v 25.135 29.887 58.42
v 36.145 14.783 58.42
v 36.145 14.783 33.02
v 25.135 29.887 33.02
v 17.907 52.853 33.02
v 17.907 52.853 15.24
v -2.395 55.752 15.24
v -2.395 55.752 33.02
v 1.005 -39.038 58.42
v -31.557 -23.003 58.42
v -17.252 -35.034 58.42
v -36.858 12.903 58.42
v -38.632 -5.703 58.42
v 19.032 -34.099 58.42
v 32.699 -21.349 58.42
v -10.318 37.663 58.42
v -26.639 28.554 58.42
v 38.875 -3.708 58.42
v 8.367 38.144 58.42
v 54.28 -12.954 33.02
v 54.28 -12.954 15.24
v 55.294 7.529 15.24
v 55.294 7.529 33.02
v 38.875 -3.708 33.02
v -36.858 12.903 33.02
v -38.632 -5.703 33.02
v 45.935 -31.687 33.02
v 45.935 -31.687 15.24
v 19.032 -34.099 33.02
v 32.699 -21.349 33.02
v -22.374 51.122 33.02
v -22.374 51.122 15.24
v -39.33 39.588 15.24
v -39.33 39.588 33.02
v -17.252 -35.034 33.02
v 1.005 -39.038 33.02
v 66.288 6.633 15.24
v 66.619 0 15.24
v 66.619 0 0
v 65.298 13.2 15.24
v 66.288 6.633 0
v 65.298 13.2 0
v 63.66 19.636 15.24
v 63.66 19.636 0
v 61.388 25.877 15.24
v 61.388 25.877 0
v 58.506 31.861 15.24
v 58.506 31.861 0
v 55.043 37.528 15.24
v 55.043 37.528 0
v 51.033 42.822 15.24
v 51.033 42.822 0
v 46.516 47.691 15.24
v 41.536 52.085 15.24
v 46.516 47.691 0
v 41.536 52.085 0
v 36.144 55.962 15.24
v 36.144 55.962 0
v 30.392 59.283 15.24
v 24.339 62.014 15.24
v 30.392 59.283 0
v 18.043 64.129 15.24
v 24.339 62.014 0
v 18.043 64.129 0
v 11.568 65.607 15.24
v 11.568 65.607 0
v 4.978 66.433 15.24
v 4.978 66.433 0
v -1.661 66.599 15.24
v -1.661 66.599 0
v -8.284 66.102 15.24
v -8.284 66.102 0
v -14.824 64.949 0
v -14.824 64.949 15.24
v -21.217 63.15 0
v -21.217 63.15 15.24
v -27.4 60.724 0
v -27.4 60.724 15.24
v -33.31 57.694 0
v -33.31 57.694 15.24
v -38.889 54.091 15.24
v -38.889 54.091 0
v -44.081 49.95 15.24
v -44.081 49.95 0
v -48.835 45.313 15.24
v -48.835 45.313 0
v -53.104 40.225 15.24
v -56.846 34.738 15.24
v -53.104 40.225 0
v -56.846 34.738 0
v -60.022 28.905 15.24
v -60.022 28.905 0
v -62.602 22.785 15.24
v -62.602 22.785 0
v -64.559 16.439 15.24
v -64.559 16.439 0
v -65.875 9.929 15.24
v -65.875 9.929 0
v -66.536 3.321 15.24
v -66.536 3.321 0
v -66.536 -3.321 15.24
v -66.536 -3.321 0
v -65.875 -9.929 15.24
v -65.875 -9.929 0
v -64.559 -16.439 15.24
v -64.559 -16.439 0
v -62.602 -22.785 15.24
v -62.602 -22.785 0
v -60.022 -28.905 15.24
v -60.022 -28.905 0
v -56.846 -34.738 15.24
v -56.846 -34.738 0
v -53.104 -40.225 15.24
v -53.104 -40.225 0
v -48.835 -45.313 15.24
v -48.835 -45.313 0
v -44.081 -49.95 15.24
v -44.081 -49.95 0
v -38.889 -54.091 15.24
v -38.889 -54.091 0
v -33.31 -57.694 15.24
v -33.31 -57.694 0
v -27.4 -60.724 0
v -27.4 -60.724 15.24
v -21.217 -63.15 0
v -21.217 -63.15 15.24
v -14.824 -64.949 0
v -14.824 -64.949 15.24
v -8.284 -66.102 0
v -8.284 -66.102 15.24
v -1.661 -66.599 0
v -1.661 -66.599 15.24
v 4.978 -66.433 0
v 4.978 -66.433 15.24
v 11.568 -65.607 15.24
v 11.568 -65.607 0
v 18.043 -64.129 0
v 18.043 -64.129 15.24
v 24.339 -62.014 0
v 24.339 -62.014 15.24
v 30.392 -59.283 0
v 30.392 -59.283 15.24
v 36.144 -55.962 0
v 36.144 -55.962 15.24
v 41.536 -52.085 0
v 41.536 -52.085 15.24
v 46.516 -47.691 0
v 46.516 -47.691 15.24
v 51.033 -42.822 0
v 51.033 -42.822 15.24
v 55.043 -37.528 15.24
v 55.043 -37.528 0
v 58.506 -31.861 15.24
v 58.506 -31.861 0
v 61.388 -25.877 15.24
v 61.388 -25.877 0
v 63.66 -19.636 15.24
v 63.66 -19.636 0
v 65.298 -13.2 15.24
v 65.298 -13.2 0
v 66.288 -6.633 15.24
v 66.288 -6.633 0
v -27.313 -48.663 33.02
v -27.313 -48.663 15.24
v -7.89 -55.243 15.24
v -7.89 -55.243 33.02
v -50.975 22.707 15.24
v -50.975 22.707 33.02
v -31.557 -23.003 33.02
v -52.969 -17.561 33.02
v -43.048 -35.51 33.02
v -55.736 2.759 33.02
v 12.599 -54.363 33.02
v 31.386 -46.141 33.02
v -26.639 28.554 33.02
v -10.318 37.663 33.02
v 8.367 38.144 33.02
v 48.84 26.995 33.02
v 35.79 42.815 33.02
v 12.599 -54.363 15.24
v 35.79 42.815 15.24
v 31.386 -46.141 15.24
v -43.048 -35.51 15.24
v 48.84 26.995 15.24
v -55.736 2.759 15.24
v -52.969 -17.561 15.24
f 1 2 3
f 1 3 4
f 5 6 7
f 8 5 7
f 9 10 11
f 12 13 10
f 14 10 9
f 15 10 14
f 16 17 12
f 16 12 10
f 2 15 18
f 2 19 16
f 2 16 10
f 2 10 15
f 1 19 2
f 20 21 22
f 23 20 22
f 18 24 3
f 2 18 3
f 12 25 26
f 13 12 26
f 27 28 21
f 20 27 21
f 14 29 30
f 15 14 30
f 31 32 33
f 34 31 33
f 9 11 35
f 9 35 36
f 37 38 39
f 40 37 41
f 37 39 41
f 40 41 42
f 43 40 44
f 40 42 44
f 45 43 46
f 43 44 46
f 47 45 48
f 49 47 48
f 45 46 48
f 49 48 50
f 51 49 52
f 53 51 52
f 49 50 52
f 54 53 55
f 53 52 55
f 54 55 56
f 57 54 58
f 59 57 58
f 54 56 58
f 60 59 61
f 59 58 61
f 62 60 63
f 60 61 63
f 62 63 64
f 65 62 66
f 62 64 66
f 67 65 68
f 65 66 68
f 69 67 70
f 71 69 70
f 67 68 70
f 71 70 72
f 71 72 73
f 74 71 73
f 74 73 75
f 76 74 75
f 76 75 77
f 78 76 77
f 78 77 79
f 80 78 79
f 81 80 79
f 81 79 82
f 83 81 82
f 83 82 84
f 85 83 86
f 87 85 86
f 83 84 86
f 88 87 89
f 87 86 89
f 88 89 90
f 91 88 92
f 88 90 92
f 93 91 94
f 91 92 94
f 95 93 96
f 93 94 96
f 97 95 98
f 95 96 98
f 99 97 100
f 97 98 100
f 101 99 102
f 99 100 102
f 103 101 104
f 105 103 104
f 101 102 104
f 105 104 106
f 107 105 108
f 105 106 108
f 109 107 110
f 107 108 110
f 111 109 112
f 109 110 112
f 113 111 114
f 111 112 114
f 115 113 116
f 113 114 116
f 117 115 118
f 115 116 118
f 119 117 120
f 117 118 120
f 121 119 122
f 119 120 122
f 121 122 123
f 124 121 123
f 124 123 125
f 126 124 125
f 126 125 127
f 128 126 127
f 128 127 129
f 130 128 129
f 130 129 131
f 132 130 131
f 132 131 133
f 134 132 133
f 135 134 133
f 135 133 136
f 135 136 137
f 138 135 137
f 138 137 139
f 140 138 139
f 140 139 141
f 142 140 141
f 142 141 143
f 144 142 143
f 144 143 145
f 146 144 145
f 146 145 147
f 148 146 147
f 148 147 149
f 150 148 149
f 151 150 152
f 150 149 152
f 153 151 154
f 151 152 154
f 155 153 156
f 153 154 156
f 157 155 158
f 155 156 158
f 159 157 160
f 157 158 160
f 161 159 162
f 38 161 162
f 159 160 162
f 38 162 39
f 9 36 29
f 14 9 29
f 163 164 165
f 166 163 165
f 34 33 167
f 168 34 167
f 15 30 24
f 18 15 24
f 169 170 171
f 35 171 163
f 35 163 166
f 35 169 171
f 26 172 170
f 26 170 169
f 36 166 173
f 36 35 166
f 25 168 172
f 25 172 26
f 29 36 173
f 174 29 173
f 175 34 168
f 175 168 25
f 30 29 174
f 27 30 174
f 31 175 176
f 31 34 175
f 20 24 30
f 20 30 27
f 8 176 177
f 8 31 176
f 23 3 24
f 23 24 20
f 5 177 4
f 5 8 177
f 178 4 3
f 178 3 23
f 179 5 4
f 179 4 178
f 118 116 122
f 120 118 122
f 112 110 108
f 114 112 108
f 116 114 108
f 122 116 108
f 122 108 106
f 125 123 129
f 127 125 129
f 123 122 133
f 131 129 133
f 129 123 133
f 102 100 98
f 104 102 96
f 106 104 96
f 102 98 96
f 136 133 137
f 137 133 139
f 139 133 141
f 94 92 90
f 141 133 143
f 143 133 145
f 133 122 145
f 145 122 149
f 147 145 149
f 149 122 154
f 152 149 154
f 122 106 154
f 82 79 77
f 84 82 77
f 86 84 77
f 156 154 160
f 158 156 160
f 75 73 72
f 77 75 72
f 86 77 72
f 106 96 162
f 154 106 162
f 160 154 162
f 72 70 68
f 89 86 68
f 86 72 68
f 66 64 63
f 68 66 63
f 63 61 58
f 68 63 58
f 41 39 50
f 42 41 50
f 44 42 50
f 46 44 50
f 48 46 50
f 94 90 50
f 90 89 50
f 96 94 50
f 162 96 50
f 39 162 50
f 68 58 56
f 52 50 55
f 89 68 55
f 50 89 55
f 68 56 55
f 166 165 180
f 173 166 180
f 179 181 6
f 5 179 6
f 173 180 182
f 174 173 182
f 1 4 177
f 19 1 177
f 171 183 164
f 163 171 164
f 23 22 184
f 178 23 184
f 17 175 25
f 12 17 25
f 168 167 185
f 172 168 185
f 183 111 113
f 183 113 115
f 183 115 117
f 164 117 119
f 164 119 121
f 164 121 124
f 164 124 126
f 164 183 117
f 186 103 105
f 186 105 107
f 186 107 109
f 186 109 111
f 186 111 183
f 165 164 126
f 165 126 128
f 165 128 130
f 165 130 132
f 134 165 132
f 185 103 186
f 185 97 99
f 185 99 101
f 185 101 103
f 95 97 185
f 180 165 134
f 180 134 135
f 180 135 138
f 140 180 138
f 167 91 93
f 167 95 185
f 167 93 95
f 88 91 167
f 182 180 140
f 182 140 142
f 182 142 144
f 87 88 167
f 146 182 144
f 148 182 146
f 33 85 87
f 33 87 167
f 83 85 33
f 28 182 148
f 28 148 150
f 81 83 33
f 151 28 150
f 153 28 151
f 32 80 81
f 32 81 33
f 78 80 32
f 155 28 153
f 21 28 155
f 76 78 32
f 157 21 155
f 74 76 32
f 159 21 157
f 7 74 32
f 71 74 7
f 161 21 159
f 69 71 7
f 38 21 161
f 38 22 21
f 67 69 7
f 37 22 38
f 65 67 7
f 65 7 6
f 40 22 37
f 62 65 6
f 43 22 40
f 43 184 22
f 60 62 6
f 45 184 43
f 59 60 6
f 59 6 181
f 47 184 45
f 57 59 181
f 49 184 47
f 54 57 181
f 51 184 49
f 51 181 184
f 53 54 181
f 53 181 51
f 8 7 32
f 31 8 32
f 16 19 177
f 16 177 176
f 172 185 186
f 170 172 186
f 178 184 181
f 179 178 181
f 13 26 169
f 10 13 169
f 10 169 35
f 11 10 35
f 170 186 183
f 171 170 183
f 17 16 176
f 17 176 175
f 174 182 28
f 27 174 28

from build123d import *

# Parameters (mm, degrees)
F0_R     = 66.619234
F1_DEPTH = 15.24
F3_DEPTH = 17.78
F5_DEPTH = 25.4


with BuildPart() as f1:
    # F0 (on Top) → F1 (new body)
    with BuildSketch(Plane.XY):
        Circle(F0_R)
    extrude(amount=F1_DEPTH)

    # F2 (on face) → F3 (join)
    with BuildSketch(Plane.XY.offset(15.24)):
        Polygon((-39.33026, 39.587958), (-50.975195, 22.706943), (-55.735648, 2.759229), (-52.968692, -17.561134), (-43.048021, -35.509768), (-27.313476, -48.662612), (-7.890095, -55.2433), (12.598887, -54.363074), (31.386319, -46.140814), (45.934856, -31.686981), (54.279635, -12.953646), (55.293649, 7.52915), (48.83995, 26.995094), (35.790144, 42.8152), (17.906681, 52.852876), (-2.395178, 55.752479), (-22.373555, 51.1224), align=None)
    extrude(amount=F3_DEPTH)

    # F4 (on face) → F5 (join)
    with BuildSketch(Plane.XY.offset(33.02)):
        Polygon((-31.556715, -23.003328), (-17.251904, -35.033573), (1.005111, -39.038048), (19.031867, -34.099376), (32.698651, -21.348949), (38.874569, -3.707734), (36.144791, 14.782877), (25.134678, 29.88691), (8.366512, 38.144212), (-10.31832, 37.663134), (-26.63935, 28.553887), (-36.857626, 12.903288), (-38.632264, -5.703299), align=None)
    extrude(amount=F5_DEPTH)


solid = f1.part
